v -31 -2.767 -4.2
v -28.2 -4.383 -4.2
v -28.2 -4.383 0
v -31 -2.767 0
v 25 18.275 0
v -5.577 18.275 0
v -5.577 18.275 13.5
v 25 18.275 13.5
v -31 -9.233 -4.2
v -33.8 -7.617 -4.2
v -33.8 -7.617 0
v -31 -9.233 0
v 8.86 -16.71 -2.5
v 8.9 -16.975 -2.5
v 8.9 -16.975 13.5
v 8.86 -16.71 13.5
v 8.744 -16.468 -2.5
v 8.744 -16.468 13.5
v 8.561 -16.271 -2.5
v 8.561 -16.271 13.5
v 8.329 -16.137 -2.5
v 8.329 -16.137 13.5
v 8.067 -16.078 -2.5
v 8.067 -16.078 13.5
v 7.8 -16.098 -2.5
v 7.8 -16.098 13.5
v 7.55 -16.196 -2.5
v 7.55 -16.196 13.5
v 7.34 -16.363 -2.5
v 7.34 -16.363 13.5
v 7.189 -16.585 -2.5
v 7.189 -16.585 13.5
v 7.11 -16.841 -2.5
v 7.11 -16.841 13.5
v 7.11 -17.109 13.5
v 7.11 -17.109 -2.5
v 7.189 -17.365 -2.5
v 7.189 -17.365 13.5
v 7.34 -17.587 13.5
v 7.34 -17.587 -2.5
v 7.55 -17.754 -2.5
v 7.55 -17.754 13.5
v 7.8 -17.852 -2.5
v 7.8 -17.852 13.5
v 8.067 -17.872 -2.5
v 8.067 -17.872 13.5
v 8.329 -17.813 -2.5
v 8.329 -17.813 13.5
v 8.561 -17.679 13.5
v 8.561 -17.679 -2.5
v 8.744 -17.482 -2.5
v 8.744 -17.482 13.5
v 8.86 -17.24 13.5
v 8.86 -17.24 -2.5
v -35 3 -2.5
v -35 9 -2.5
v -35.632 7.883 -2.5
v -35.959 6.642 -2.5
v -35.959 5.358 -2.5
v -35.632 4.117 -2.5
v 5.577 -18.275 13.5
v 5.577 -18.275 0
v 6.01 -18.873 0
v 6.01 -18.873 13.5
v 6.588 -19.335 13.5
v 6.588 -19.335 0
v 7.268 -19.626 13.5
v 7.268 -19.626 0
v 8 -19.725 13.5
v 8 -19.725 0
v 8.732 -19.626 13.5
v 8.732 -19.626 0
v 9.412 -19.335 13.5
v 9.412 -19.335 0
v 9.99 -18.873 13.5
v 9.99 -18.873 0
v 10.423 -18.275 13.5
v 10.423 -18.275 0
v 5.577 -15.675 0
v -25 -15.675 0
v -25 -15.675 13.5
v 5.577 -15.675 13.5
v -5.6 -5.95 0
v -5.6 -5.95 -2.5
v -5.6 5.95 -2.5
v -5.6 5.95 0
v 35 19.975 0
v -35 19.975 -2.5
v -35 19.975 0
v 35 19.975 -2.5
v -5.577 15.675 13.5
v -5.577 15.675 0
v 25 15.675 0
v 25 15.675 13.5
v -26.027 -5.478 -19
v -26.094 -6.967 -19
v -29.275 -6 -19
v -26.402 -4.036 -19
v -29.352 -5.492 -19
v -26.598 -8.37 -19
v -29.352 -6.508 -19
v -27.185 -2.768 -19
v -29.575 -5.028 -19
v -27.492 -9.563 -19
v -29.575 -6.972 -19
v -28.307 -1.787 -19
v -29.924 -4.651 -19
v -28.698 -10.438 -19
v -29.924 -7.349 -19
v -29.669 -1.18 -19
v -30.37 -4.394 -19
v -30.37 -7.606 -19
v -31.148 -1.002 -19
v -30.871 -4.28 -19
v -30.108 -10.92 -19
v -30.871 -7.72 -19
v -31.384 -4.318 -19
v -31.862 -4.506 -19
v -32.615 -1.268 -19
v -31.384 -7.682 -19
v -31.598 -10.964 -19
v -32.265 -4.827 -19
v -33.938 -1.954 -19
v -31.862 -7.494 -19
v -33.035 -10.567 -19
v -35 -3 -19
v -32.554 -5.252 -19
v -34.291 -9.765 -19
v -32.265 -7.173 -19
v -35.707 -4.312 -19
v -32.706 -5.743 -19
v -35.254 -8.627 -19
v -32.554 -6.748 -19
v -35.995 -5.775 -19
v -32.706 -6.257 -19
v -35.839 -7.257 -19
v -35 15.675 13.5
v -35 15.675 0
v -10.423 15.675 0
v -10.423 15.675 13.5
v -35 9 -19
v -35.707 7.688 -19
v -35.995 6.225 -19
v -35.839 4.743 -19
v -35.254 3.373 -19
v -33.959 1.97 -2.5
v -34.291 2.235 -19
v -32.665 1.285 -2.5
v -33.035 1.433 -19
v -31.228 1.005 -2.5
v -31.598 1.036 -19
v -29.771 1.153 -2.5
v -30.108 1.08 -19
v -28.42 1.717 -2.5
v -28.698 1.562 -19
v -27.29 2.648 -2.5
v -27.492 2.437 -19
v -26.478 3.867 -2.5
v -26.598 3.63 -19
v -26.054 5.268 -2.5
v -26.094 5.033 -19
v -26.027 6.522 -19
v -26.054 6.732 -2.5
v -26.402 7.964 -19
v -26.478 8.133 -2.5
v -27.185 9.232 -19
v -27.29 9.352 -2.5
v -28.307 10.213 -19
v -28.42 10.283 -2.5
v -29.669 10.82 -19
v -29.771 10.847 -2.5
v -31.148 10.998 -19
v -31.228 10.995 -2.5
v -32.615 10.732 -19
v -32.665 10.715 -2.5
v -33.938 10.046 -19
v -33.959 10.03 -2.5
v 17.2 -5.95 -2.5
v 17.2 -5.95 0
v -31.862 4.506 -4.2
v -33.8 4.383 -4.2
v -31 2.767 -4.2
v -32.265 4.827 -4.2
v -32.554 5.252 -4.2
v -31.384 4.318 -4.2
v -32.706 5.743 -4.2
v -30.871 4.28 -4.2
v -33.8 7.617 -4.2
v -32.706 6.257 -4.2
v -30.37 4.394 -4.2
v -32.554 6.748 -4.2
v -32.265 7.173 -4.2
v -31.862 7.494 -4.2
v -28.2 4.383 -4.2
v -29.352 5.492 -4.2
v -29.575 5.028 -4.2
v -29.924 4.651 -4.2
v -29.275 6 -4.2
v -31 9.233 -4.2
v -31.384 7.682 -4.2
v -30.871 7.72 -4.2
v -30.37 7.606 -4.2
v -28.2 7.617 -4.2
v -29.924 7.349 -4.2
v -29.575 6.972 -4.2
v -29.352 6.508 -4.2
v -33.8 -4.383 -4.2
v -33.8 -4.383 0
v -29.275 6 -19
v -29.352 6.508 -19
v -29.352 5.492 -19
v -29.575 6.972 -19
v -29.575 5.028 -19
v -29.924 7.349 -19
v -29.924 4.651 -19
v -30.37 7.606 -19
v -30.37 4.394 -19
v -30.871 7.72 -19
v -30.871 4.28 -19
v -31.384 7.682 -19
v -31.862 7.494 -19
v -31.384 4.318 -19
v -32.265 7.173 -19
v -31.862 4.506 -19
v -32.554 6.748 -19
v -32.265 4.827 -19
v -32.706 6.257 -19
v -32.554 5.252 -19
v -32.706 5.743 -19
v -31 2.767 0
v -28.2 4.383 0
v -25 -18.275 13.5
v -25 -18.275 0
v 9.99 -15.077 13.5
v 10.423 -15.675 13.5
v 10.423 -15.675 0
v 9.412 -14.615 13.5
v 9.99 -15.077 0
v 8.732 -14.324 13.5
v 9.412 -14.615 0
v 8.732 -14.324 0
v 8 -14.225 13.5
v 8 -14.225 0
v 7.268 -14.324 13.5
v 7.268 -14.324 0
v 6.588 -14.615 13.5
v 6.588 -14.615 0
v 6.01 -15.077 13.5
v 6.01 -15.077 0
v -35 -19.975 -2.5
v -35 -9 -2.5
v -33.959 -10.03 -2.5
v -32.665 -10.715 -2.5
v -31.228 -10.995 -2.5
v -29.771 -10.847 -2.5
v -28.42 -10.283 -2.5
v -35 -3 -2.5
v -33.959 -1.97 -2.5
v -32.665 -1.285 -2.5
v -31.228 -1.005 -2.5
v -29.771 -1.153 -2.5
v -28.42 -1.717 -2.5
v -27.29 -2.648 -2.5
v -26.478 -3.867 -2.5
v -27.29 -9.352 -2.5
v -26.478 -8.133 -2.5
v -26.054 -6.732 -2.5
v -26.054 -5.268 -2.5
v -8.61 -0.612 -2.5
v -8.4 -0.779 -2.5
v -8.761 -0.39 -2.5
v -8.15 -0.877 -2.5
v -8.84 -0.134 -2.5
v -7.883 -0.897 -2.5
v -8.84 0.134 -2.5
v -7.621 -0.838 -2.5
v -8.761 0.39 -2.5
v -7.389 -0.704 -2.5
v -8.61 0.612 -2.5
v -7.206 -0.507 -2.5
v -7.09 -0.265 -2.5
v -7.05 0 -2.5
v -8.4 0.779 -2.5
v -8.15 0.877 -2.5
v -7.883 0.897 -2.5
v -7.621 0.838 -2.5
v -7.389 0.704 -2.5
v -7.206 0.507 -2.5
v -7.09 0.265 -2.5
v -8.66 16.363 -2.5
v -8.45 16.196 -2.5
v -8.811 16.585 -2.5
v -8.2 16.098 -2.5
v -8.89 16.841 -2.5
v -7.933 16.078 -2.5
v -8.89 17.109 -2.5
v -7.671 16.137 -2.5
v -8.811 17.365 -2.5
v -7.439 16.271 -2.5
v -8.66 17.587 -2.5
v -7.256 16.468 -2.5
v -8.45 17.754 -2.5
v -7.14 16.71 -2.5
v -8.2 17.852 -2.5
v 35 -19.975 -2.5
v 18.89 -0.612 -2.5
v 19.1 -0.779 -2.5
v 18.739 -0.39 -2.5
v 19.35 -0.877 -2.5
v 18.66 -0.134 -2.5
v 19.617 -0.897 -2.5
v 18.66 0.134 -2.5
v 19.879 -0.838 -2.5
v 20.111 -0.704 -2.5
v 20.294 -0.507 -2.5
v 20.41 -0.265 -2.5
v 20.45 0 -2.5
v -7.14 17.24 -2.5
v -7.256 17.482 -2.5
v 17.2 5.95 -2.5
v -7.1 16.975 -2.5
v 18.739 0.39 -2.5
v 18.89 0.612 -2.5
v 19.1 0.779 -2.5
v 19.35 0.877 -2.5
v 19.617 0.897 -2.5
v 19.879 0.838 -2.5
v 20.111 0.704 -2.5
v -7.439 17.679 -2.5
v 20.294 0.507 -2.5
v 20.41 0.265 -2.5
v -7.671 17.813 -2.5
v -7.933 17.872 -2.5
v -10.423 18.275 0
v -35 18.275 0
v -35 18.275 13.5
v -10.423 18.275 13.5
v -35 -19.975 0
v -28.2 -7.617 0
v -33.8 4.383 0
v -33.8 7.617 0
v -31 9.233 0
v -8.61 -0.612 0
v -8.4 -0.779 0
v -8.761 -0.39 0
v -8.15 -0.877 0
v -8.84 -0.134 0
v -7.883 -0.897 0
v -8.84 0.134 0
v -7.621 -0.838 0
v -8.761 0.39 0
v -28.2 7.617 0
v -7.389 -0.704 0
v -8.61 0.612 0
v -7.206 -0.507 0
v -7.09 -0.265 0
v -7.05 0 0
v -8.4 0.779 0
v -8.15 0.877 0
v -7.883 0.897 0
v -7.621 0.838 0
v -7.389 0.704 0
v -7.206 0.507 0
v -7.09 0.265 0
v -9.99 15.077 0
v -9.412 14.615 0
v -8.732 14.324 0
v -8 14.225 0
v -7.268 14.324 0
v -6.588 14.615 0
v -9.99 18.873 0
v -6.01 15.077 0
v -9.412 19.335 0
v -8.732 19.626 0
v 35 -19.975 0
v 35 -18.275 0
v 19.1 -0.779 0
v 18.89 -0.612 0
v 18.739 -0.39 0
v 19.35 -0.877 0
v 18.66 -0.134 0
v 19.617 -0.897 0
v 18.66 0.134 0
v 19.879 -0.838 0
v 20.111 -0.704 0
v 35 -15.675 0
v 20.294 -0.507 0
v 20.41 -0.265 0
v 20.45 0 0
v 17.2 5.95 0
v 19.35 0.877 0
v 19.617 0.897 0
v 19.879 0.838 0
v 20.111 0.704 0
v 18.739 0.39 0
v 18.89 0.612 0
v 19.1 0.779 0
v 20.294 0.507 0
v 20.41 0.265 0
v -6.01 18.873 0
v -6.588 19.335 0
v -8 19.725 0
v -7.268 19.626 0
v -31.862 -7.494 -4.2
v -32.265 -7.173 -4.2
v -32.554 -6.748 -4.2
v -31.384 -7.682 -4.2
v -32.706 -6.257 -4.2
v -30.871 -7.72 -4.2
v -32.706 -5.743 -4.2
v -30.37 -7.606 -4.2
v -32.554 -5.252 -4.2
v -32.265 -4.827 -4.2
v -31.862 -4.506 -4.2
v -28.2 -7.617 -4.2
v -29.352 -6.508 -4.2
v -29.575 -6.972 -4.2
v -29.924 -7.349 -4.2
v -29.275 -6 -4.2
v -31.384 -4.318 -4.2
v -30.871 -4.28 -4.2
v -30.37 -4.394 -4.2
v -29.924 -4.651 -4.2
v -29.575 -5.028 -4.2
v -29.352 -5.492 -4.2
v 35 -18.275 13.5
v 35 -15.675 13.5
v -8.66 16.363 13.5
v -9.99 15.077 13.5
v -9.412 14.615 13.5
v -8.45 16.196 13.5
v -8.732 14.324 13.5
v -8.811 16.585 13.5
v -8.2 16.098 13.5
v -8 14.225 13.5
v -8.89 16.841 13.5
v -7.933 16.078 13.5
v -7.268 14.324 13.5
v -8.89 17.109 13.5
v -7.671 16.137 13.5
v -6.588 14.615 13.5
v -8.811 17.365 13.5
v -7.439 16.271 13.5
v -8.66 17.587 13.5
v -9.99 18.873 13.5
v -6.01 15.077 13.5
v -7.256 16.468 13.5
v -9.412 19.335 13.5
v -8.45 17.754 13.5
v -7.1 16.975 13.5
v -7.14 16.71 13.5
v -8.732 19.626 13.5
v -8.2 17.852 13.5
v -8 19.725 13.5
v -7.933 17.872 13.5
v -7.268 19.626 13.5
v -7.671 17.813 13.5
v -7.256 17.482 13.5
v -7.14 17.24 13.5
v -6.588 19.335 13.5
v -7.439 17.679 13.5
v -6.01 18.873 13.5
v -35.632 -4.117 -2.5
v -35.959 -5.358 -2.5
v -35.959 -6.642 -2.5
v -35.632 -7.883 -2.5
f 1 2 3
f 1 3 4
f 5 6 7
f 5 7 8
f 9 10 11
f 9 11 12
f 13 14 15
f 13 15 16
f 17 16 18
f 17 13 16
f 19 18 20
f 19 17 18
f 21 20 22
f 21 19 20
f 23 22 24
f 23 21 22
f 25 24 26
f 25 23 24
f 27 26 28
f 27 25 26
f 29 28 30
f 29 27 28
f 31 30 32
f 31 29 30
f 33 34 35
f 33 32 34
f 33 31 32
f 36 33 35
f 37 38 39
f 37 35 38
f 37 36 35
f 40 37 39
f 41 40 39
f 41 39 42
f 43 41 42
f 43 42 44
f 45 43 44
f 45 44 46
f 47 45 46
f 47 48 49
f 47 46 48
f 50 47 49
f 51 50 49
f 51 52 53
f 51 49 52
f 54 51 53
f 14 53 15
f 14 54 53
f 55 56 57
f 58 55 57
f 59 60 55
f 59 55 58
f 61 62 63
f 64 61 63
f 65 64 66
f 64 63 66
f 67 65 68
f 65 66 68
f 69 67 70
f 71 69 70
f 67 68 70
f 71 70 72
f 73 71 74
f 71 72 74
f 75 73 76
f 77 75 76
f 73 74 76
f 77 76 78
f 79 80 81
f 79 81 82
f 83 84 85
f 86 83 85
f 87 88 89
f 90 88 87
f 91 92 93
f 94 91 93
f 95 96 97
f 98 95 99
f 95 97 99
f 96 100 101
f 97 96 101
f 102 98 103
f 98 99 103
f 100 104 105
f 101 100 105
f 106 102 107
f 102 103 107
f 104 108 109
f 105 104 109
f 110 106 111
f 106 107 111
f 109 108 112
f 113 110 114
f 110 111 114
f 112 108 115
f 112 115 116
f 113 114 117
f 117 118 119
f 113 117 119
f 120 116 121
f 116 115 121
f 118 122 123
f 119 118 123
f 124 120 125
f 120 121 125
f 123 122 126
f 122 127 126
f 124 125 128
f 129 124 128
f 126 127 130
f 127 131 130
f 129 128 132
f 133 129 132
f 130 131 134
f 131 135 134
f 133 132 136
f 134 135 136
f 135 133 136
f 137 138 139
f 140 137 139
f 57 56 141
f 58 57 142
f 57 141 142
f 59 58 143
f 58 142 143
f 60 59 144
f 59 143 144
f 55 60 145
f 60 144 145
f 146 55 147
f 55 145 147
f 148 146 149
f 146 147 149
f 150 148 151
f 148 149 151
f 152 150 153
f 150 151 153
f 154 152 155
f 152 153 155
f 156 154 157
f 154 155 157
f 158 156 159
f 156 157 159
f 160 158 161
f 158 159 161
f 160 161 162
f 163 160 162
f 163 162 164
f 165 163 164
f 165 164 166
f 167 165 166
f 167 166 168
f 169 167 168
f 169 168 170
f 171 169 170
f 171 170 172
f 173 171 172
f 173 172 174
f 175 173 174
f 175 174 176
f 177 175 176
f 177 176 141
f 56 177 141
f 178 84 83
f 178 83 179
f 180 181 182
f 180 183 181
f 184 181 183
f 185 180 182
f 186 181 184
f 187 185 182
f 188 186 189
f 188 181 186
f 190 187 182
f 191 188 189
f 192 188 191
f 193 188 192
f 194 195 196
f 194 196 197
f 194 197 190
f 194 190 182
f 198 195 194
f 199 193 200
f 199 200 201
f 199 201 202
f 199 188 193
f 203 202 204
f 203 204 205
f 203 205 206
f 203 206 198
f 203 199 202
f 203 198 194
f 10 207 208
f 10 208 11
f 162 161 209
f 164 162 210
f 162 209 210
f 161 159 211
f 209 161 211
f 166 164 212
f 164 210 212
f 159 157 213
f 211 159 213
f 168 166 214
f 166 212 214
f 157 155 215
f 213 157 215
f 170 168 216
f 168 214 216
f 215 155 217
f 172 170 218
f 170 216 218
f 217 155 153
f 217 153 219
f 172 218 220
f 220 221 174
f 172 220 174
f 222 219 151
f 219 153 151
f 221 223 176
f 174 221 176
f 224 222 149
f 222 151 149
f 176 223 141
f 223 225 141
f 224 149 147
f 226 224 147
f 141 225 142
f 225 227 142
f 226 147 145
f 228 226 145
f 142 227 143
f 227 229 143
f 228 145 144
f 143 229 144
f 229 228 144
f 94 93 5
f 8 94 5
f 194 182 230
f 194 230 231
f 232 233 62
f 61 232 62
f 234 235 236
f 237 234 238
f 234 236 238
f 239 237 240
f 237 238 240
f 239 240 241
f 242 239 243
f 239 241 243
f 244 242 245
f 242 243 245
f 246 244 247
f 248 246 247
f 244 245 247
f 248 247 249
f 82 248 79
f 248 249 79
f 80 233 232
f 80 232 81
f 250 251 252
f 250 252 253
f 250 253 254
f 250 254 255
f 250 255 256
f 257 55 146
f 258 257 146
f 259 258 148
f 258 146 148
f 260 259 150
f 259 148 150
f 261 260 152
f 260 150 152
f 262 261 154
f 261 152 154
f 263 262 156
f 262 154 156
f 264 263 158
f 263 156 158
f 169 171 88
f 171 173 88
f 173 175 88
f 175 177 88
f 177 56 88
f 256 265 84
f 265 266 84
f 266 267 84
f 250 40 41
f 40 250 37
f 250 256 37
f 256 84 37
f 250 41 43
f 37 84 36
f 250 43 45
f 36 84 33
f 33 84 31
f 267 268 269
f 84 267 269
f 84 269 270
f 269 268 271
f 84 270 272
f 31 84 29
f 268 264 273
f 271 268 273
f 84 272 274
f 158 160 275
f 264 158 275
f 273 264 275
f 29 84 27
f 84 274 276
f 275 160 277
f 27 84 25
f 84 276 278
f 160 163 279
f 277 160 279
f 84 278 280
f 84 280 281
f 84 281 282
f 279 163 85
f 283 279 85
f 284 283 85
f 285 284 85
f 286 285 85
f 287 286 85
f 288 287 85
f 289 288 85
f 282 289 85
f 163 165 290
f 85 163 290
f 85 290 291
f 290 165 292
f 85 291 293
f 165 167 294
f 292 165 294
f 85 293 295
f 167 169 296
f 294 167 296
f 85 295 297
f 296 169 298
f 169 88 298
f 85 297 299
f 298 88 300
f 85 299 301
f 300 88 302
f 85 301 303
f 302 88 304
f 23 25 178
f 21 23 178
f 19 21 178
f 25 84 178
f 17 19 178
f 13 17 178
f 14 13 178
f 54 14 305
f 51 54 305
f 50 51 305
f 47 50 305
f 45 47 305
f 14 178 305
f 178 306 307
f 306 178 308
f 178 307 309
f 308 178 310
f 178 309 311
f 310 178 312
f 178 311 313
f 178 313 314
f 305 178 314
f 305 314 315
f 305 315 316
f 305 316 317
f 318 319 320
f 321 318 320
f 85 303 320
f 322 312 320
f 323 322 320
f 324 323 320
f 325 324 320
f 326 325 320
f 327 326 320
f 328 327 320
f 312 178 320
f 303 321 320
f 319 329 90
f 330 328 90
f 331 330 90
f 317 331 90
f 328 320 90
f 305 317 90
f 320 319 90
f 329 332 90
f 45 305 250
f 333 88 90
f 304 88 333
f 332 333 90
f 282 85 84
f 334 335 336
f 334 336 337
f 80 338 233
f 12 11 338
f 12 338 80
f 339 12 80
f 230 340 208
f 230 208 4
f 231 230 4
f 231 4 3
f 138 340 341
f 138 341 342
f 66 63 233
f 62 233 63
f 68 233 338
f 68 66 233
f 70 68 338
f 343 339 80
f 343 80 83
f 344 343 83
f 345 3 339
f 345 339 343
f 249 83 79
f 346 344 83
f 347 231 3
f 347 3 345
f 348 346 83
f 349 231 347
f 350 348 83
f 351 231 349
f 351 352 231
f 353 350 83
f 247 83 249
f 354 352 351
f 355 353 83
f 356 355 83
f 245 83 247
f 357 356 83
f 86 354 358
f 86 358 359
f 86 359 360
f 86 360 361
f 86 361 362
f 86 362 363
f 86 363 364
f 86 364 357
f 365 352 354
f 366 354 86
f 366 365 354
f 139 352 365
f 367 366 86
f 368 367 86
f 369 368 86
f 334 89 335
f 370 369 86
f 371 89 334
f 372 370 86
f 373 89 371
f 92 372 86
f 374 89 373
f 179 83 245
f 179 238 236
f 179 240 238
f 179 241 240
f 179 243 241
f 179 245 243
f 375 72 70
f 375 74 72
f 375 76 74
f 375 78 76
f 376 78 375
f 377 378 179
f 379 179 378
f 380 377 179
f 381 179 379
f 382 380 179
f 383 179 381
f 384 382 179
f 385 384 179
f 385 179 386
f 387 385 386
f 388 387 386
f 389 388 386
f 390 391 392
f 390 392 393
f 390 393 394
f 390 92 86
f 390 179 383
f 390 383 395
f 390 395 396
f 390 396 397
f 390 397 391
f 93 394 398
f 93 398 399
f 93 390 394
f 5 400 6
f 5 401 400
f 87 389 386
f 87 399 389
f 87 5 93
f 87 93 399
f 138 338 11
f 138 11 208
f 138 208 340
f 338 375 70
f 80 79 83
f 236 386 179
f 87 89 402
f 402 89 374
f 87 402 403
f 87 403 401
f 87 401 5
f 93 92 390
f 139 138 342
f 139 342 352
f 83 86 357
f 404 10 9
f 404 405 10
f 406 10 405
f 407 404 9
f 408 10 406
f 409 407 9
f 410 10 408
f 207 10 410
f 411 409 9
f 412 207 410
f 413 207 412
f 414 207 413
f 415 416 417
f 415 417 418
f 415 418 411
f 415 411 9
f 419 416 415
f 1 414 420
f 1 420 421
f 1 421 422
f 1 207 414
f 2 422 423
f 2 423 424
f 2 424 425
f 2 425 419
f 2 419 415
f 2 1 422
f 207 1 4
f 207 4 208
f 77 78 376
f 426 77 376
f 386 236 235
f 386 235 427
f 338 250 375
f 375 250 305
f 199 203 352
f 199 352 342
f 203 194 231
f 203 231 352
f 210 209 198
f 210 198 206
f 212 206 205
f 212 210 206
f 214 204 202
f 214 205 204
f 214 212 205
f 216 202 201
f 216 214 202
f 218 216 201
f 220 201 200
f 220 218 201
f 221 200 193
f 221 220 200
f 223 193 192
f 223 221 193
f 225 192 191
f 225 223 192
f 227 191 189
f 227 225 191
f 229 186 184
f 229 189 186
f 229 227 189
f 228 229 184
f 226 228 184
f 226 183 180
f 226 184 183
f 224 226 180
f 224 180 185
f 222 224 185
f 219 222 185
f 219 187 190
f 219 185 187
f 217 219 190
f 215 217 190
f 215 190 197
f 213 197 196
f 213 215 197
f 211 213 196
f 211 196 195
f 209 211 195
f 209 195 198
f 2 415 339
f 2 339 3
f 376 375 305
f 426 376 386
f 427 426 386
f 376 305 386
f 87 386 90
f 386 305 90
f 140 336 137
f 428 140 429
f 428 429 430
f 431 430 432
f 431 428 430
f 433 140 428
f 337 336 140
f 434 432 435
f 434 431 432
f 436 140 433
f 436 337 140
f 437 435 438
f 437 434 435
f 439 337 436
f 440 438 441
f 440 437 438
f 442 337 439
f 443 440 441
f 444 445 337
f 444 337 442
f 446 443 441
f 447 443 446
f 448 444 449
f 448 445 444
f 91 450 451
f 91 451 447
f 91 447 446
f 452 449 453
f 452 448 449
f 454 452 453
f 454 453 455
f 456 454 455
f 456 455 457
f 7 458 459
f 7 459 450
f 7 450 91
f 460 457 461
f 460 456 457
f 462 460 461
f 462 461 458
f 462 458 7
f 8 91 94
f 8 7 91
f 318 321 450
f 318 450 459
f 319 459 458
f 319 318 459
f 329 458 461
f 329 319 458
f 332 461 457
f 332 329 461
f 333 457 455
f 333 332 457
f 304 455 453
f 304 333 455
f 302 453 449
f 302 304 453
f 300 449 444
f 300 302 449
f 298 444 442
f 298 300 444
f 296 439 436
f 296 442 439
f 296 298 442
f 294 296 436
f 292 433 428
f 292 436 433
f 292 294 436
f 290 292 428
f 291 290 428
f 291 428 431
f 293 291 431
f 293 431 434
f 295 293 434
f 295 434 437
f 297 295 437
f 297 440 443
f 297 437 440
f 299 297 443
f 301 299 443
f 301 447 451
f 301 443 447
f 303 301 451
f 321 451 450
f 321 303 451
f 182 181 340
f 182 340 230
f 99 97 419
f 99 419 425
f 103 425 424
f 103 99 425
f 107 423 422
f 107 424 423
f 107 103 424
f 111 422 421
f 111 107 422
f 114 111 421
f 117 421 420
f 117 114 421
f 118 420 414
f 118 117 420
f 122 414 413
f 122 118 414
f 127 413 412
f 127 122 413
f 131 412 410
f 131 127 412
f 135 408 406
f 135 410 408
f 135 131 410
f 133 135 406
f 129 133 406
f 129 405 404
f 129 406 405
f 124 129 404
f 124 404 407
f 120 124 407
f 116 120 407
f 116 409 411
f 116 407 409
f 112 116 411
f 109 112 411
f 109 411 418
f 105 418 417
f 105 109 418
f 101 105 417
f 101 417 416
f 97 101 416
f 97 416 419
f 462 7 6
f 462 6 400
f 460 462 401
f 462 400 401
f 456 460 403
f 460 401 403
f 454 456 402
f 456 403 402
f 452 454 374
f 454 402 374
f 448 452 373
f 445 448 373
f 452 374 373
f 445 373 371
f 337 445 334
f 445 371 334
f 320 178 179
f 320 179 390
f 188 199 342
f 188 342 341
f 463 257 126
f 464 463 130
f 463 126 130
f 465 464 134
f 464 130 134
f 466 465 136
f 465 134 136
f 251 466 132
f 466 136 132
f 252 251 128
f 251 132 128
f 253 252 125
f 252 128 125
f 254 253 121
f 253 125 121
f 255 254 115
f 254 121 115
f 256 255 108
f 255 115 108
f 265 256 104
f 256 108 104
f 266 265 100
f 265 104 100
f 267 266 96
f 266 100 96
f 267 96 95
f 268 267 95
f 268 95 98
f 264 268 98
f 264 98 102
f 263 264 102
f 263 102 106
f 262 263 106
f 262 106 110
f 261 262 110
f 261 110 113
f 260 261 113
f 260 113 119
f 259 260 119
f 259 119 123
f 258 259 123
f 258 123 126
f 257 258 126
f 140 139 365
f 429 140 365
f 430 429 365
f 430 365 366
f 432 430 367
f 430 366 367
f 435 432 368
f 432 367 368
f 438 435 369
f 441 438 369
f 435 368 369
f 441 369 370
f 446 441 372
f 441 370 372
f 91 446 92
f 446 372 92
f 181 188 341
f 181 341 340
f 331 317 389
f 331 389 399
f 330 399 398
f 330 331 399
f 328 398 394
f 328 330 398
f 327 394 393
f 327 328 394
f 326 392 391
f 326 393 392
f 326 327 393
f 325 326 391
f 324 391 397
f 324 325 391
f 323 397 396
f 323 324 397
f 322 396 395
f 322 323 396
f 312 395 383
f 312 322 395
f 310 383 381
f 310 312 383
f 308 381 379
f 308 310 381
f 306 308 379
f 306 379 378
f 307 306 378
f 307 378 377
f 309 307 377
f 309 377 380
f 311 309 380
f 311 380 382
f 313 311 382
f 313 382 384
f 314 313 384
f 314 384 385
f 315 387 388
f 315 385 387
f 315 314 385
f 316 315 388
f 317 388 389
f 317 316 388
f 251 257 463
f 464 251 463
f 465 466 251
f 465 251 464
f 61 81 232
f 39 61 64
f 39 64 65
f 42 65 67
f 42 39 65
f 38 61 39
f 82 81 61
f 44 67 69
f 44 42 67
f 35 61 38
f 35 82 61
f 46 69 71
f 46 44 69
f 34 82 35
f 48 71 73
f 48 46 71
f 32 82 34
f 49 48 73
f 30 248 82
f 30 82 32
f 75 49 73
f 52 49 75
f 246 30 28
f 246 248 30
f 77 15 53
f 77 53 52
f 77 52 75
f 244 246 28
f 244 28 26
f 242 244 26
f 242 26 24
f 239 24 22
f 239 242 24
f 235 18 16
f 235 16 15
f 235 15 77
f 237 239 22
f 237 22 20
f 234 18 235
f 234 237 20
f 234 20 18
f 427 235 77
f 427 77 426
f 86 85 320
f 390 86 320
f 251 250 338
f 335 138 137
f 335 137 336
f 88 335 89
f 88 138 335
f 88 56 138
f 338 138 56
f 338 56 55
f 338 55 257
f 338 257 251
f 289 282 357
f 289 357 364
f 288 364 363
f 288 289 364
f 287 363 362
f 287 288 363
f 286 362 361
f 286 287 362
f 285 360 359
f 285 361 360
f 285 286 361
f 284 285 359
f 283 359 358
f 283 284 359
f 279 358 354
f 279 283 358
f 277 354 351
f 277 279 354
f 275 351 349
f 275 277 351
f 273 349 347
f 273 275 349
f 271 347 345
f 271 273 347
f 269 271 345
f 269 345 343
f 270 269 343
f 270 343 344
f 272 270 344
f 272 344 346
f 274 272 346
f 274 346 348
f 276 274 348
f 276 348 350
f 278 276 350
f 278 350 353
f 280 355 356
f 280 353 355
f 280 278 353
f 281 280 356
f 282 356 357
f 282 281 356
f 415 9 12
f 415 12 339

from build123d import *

# Parameters (mm, degrees)
BOSS_EXTRUDE1_START     = -2.5
SKETCH1_W               = 70
SKETCH1_H               = 39.95
BOSS_EXTRUDE1_DEPTH     = 2.5
SKETCH2_W               = 60
SKETCH2_H               = 2.6
BOSS_EXTRUDE2_DEPTH     = 13.5
SKETCH3_W               = 60
SKETCH3_H               = 2.6
BOSS_EXTRUDE3_DEPTH     = 13.5
SKETCH4_R               = 2.75
BOSS_EXTRUDE4_DEPTH     = 13.5
BOSS_EXTRUDE5_START     = -19
SKETCH5_R               = 5
BOSS_EXTRUDE5_DEPTH     = 16.5
CUT_EXTRUDE1_DEPTH      = 46.343143087
CUT_EXTRUDE1_DEPTH_BACK = 46.343143087
SKETCH6_W               = 22.8
SKETCH6_H               = 11.9
CUT_EXTRUDE2_DEPTH      = 46.343143087
CUT_EXTRUDE2_DEPTH_BACK = 46.343143087
SKETCH7_R               = 0.9
CUT_EXTRUDE3_DEPTH      = 46.343143087
CUT_EXTRUDE3_DEPTH_BACK = 46.343143087
SKETCH8_R               = 0.9
CUT_EXTRUDE4_DEPTH      = 46.343143087
CUT_EXTRUDE4_DEPTH_BACK = 46.343143087
SKETCH9_R               = 1.725
CUT_EXTRUDE5_START      = -4.2
CUT_EXTRUDE5_DEPTH      = 4.2


with BuildPart() as part:
    # Sketch1 → Boss-Extrude1 (new body)
    with BuildSketch(Plane.XY.offset(BOSS_EXTRUDE1_START)):
        Rectangle(SKETCH1_W, SKETCH1_H)
    extrude(amount=BOSS_EXTRUDE1_DEPTH)

    # Sketch2 → Boss-Extrude2 (add)
    with BuildSketch(Plane.XY):
        with Locations((-5, 16.975)):
            Rectangle(SKETCH2_W, SKETCH2_H)
    extrude(amount=BOSS_EXTRUDE2_DEPTH)

    # Sketch3 → Boss-Extrude3 (add)
    with BuildSketch(Plane.XY):
        with Locations((5, -16.975)):
            Rectangle(SKETCH3_W, SKETCH3_H)
    extrude(amount=BOSS_EXTRUDE3_DEPTH)

    # Sketch4 → Boss-Extrude4 (add)
    with BuildSketch(Plane.XY):
        with Locations((-8, 16.975)):
            Circle(SKETCH4_R)
        with Locations((8, -16.975)):
            Circle(SKETCH4_R)
    extrude(amount=BOSS_EXTRUDE4_DEPTH)

    # Sketch5 → Boss-Extrude5 (add)
    with BuildSketch(Plane.XY.offset(BOSS_EXTRUDE5_START)):
        with Locations(Location((-31, 6, 0), (0, 0, 143.130102354))):
            Circle(SKETCH5_R)
        with Locations(Location((-31, -6, 0), (0, 0, 143.130102354))):
            Circle(SKETCH5_R)
    extrude(amount=BOSS_EXTRUDE5_DEPTH)

    # Sketch6 → Cut-Extrude1 (cut, two sides: drawn at the far end of the back side and taken through both)
    with BuildSketch(Plane.XY.offset(-CUT_EXTRUDE1_DEPTH_BACK)):
        with Locations((5.8, 0)):
            Rectangle(SKETCH6_W, SKETCH6_H)
    extrude(amount=CUT_EXTRUDE1_DEPTH + CUT_EXTRUDE1_DEPTH_BACK, mode=Mode.SUBTRACT)

    # Sketch7 → Cut-Extrude2 (cut, two sides: drawn at the far end of the back side and taken through both)
    with BuildSketch(Plane.XY.offset(-CUT_EXTRUDE2_DEPTH_BACK)):
        with Locations((-7.95, 0)):
            Circle(SKETCH7_R)
        with Locations((19.55, 0)):
            Circle(SKETCH7_R)
    extrude(amount=CUT_EXTRUDE2_DEPTH + CUT_EXTRUDE2_DEPTH_BACK, mode=Mode.SUBTRACT)

    # Sketch8 → Cut-Extrude3 (cut, two sides: drawn at the far end of the back side and taken through both)
    with BuildSketch(Plane.XY.offset(-CUT_EXTRUDE3_DEPTH_BACK)):
        with Locations((-8, 16.975)):
            Circle(SKETCH8_R)
        with Locations((8, -16.975)):
            Circle(SKETCH8_R)
    extrude(amount=CUT_EXTRUDE3_DEPTH + CUT_EXTRUDE3_DEPTH_BACK, mode=Mode.SUBTRACT)

    # Sketch9 → Cut-Extrude4 (cut, two sides: drawn at the far end of the back side and taken through both)
    with BuildSketch(Plane.XY.offset(-CUT_EXTRUDE4_DEPTH_BACK)):
        with Locations((-31, 6)):
            Circle(SKETCH9_R)
        with Locations((-31, -6)):
            Circle(SKETCH9_R)
    extrude(amount=CUT_EXTRUDE4_DEPTH + CUT_EXTRUDE4_DEPTH_BACK, mode=Mode.SUBTRACT)

    # Sketch10 → Cut-Extrude5 (cut)
    with BuildSketch(Plane.XY.offset(CUT_EXTRUDE5_START)):
        Polygon((-28.2, 7.616580754), (-31, 9.233161507), (-33.8, 7.616580754), (-33.8, 4.383419246), (-31, 2.766838493), (-28.2, 4.383419246), align=None)
        Polygon((-28.2, -4.383419246), (-31, -2.766838493), (-33.8, -4.383419246), (-33.8, -7.616580754), (-31, -9.233161507), (-28.2, -7.616580754), align=None)
    extrude(amount=CUT_EXTRUDE5_DEPTH, mode=Mode.SUBTRACT)


solid = part.part
